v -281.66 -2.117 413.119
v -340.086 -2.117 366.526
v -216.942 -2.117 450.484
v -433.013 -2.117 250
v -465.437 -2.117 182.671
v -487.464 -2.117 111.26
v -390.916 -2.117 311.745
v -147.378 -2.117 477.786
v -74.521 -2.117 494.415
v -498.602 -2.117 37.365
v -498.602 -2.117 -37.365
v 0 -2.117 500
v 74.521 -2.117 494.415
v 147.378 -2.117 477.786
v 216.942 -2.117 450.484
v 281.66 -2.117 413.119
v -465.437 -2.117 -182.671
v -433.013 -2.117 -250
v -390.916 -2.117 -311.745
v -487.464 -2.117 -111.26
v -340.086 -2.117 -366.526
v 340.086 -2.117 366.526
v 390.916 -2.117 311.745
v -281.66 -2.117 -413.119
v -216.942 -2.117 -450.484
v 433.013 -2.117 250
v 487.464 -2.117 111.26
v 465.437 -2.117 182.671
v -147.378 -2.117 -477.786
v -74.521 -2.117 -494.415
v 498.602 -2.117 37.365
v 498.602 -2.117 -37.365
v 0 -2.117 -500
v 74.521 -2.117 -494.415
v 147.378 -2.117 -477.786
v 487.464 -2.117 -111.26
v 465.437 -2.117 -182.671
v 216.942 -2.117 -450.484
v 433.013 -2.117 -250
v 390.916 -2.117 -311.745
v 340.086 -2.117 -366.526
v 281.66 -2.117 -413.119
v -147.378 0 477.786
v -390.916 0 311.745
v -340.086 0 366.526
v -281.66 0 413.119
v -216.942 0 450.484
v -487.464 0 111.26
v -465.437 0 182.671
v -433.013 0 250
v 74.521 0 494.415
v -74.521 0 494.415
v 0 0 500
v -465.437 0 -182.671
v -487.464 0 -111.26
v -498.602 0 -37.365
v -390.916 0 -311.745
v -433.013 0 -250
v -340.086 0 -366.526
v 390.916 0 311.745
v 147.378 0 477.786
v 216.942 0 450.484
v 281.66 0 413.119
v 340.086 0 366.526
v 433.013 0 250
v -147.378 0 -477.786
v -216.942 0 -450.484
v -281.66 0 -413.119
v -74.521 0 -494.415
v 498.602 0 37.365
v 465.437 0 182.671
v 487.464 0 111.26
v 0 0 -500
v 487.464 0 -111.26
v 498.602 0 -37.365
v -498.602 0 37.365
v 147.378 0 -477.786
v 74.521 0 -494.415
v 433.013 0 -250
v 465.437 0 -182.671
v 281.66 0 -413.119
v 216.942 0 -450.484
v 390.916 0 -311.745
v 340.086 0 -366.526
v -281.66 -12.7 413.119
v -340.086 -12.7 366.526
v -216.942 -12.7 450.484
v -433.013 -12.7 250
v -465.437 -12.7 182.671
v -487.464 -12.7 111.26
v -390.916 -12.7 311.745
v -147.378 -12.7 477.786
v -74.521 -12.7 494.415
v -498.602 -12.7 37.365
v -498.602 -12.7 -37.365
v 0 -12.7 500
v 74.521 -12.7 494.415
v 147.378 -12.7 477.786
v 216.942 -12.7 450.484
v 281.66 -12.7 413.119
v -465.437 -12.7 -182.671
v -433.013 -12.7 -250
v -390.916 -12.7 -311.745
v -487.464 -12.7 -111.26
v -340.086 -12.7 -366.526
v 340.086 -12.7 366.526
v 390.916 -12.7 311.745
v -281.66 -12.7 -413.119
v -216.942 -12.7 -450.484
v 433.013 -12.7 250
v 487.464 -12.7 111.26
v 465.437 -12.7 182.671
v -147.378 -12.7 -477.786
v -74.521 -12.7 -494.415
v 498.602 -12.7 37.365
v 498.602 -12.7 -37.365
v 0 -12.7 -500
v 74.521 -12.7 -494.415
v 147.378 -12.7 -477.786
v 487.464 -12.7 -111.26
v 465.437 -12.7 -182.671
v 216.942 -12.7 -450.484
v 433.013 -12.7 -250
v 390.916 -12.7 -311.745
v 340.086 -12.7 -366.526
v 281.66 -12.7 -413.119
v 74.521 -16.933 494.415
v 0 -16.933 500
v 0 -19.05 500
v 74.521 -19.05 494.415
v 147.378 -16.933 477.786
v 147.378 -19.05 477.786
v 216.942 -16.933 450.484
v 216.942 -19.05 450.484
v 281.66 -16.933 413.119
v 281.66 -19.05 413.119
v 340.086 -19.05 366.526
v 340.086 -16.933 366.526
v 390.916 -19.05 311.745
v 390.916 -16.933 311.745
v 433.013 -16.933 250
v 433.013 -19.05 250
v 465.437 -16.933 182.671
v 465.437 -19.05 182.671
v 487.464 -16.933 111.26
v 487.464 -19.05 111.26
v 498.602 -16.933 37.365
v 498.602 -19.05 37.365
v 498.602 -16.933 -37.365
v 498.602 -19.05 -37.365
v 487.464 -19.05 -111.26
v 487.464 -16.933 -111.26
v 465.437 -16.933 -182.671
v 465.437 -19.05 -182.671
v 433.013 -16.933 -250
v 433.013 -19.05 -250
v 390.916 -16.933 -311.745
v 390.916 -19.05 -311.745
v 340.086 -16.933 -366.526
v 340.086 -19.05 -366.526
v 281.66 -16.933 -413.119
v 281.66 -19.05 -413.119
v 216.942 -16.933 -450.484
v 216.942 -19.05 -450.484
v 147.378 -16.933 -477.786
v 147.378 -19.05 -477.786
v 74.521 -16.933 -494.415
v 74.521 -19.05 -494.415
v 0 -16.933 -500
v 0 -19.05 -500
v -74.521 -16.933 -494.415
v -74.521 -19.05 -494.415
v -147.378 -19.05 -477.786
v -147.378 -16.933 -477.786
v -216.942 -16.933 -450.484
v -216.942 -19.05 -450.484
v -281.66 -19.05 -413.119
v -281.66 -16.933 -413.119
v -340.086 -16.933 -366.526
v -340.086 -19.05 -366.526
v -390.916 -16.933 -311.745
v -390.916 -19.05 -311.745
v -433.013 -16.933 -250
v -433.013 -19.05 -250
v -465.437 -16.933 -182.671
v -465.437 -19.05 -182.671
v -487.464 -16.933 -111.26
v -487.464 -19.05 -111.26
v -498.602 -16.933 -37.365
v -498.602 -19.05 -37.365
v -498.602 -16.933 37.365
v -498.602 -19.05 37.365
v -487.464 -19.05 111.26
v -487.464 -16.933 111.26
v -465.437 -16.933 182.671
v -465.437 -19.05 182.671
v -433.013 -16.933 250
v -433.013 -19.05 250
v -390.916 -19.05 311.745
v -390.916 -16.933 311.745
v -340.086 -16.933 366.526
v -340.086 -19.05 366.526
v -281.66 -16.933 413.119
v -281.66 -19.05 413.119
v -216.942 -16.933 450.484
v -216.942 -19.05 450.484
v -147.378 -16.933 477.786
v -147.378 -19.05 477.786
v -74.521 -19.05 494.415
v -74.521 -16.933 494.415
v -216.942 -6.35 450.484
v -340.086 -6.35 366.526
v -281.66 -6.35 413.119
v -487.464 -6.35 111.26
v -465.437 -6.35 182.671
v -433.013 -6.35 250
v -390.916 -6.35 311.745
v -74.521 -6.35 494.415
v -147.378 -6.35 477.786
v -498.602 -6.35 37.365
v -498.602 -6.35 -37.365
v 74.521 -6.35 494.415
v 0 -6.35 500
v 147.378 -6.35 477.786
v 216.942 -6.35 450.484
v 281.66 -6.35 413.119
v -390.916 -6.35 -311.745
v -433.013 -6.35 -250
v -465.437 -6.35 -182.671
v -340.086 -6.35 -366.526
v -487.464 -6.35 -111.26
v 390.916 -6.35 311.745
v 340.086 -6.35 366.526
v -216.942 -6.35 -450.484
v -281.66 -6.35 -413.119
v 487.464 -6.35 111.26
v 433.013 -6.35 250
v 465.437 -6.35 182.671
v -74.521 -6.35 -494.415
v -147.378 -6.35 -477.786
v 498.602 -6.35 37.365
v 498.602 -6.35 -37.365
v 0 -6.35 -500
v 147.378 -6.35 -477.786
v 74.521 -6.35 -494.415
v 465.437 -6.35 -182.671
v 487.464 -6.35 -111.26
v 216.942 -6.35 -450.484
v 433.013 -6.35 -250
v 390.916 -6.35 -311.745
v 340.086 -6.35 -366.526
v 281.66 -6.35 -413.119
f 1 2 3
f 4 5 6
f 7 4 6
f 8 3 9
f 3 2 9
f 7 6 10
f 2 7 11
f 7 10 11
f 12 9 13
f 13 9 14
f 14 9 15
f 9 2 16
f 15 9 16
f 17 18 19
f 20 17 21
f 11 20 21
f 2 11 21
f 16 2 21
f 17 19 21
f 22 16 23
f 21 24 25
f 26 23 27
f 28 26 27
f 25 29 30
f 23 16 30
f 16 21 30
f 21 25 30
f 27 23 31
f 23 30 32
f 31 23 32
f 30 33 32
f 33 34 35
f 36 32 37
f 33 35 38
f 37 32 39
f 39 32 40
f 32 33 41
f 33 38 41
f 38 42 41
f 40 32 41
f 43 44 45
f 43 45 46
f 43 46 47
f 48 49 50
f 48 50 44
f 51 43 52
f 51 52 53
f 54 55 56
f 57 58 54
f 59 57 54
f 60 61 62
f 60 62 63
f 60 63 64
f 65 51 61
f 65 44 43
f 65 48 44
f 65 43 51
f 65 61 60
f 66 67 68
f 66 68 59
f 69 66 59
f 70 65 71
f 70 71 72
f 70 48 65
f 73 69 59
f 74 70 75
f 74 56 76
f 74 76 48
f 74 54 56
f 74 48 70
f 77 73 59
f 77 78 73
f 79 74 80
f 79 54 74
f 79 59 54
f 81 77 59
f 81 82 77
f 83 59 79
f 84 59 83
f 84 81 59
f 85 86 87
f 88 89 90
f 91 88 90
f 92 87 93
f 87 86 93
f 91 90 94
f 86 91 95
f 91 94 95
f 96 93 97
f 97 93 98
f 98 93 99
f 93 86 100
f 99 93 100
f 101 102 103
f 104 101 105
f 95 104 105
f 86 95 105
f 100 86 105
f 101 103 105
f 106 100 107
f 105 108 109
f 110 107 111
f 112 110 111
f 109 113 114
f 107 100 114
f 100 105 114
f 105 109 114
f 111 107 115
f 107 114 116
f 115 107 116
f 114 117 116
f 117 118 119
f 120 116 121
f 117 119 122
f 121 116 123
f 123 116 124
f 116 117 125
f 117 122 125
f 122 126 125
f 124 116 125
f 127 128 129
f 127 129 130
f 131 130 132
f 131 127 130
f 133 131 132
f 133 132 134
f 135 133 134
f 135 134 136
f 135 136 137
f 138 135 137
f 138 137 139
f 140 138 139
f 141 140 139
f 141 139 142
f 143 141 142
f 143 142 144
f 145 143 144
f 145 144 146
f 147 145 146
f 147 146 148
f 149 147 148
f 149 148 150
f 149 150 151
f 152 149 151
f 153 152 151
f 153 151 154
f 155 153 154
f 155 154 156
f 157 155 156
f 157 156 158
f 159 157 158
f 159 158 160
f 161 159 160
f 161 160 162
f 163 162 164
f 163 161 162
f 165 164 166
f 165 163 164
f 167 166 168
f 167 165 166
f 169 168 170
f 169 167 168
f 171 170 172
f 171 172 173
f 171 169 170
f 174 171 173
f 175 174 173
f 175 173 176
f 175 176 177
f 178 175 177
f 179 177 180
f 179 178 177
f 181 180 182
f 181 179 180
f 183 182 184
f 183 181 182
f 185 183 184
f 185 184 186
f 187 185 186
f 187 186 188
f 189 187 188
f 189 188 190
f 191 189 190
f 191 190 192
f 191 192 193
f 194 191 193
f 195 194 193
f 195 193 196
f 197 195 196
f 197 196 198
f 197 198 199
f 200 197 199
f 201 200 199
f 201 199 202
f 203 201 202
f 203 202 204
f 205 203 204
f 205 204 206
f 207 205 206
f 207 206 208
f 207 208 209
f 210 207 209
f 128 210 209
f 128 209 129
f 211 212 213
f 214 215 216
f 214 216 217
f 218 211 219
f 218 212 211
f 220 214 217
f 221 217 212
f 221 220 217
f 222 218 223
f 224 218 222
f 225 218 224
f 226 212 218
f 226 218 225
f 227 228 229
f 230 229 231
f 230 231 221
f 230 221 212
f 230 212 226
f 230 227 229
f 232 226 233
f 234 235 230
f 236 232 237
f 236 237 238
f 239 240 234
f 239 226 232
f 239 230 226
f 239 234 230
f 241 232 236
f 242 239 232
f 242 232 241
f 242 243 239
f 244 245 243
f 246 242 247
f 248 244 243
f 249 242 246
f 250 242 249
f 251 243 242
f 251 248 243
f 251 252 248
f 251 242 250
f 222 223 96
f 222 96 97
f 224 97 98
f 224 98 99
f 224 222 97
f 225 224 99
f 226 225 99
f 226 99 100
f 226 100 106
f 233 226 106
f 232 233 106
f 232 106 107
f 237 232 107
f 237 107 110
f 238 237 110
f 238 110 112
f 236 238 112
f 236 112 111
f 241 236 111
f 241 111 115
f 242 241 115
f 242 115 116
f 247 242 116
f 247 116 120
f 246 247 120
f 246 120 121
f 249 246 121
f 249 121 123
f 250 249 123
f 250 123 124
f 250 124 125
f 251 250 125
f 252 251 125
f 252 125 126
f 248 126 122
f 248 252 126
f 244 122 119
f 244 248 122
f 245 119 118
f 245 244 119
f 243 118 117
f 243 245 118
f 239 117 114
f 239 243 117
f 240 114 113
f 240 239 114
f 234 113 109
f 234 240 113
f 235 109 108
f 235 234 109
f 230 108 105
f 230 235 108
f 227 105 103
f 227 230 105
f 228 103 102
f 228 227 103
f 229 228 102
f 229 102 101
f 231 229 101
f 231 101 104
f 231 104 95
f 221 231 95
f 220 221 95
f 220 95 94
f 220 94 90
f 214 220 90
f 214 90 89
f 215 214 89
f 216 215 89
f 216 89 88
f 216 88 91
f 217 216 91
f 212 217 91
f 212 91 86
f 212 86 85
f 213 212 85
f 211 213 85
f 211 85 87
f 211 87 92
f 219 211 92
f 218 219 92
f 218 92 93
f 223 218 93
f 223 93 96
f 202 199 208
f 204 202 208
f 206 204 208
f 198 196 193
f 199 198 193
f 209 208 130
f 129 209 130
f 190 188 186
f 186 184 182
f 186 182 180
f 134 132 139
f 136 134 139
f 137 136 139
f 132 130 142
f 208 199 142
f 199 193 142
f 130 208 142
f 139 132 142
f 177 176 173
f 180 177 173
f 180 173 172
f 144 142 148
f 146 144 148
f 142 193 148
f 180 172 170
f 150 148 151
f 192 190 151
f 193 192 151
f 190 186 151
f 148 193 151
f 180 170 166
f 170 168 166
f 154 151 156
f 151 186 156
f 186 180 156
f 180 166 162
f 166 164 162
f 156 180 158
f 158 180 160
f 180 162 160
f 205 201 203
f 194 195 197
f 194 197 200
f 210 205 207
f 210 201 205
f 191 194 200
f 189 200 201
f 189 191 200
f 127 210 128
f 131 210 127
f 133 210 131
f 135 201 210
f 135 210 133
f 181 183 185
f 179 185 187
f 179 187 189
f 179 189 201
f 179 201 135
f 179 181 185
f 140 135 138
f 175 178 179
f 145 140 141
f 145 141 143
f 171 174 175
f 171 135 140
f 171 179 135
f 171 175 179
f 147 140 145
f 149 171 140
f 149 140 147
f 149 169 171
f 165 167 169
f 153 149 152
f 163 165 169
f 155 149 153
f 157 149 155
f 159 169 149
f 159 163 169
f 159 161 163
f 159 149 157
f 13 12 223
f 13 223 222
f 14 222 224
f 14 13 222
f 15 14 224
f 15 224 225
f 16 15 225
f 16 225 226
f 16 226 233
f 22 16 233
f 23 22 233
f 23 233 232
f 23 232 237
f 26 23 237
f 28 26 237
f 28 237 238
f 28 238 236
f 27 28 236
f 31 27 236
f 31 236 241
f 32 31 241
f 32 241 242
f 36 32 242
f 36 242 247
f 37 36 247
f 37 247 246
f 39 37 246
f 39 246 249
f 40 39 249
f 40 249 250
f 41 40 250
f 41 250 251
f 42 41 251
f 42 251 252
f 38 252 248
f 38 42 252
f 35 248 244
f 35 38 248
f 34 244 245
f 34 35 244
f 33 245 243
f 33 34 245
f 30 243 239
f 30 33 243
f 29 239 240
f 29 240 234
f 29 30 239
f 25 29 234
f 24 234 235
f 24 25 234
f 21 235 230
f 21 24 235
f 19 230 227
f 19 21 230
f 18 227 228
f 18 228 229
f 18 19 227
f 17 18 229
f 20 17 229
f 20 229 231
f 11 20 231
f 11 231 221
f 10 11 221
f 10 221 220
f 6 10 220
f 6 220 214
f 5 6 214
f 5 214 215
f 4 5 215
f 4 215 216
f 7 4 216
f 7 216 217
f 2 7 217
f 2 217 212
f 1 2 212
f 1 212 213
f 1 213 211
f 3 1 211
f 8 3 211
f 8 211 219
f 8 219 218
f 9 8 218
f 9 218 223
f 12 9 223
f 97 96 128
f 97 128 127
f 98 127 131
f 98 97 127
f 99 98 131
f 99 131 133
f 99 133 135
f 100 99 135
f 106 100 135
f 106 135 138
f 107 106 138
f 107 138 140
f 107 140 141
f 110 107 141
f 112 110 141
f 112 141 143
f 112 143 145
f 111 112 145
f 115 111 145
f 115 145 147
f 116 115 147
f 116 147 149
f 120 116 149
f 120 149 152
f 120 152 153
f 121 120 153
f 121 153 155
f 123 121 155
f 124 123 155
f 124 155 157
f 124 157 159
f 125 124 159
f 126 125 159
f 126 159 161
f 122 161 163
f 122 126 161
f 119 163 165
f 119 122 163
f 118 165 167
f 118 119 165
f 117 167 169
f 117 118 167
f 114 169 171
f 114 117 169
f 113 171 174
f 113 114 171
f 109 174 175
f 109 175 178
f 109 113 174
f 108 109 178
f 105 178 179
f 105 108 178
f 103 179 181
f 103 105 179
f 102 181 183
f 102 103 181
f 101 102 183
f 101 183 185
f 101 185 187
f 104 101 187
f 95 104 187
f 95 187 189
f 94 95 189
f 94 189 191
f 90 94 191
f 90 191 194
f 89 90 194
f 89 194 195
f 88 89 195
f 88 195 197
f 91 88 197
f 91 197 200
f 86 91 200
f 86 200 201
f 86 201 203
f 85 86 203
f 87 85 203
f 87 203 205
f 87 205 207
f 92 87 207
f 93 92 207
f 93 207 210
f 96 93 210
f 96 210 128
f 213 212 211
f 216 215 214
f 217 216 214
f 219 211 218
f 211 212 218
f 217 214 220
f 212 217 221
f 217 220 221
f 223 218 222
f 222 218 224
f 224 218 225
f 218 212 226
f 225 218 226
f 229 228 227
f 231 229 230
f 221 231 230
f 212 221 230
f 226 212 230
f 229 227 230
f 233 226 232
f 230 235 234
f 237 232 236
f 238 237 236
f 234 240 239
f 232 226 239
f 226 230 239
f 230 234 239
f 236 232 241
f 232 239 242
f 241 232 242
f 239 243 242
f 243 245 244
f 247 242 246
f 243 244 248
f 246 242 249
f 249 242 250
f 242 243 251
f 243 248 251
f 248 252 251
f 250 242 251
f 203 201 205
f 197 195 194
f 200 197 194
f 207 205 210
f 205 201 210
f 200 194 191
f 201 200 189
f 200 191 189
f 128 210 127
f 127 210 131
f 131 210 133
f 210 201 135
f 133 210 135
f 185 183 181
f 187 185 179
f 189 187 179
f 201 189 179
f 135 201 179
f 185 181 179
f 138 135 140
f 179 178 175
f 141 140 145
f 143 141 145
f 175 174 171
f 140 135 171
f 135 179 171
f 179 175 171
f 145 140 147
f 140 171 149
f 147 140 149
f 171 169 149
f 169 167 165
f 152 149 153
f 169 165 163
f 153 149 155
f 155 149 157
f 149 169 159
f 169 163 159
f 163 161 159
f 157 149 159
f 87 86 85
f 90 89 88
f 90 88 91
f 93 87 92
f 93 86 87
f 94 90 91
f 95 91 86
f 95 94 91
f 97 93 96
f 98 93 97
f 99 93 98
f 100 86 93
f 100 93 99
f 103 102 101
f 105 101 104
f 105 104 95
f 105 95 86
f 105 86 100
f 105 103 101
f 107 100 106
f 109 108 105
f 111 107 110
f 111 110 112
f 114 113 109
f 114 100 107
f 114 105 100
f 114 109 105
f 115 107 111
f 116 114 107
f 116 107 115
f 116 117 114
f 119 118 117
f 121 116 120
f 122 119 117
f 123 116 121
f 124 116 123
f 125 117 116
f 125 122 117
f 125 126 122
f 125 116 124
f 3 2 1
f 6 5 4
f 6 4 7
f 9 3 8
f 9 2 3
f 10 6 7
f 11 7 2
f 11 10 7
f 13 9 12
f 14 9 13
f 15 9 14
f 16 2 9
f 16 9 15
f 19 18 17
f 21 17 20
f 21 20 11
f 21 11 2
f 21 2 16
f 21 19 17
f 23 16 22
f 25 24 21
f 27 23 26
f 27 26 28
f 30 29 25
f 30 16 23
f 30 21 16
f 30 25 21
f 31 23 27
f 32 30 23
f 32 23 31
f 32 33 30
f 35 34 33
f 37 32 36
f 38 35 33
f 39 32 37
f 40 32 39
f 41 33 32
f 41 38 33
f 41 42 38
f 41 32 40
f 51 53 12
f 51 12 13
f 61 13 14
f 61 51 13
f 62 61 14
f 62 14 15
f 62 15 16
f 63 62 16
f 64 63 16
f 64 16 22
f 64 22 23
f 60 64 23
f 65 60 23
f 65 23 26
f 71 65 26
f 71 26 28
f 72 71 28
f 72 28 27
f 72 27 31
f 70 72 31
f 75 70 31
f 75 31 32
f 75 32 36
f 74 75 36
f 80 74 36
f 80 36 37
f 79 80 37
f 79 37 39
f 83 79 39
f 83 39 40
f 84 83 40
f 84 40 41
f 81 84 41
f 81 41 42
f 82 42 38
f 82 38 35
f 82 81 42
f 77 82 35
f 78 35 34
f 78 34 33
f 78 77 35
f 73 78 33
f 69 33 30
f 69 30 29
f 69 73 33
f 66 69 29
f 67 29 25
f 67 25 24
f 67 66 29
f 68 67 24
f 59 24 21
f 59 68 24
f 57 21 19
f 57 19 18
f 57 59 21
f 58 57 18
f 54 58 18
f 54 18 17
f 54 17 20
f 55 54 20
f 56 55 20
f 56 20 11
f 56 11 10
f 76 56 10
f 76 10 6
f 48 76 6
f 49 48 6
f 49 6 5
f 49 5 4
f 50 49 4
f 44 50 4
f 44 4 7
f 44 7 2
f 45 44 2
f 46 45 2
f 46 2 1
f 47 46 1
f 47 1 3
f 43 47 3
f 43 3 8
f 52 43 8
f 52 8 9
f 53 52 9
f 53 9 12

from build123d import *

# Parameters (mm, degrees)
SKETCH3_W                = 1219.2
SKETCH3_H                = 1219.2
BOSS_EXTRUDE1_DEPTH      = 19.05
SPLIT1_SURFACE_1_1_BACK  = 1725.314
SPLIT1_SURFACE_1_1_DEPTH = 3450.628
SPLIT1_SURFACE_1_2_BACK  = 1725.314
SPLIT1_SURFACE_1_2_DEPTH = 3450.628
SPLIT1_SURFACE_2_3_BACK  = 1725.314
SPLIT1_SURFACE_2_3_DEPTH = 3450.628
SPLIT1_SURFACE_2_4_BACK  = 1725.314
SPLIT1_SURFACE_2_4_DEPTH = 3450.628
SPLIT1_SURFACE_3_5_BACK  = 1725.314
SPLIT1_SURFACE_3_5_DEPTH = 3450.628
SPLIT1_SURFACE_3_6_BACK  = 1725.314
SPLIT1_SURFACE_3_6_DEPTH = 3450.628
SPLIT1_SURFACE_4_7_BACK  = 1725.314
SPLIT1_SURFACE_4_7_DEPTH = 3450.628
SPLIT1_SURFACE_4_8_BACK  = 1725.314
SPLIT1_SURFACE_4_8_DEPTH = 3450.628
SKETCH6_W                = 1219.2
SKETCH6_H                = 1219.2
SKETCH6_R                = 500
CUT_EXTRUDE1_DEPTH       = 863.315036689


with BuildPart() as part:
    # Sketch3 → Boss-Extrude1 (new body)
    with BuildSketch(Plane(origin=(0, 0, 0), x_dir=(1, 0, 0), z_dir=(0, 1, 0))):
        Rectangle(SKETCH3_W, SKETCH3_H)
    extrude(amount=-BOSS_EXTRUDE1_DEPTH)


with BuildPart() as body_2:
    # Split1: the piece behind the surface
    add(part.part)
    # Split1 surface 1: a surface, the sketch's curves swept straight by 3450.628 mm
    with BuildLine(Plane.XY.offset(-SPLIT1_SURFACE_1_1_BACK), mode=Mode.PRIVATE) as split1_surface_1_1_path:
        Line((-670.56, -16.933333333), (670.56, -16.933333333))
    split1_surface_1_1 = Shell.extrude(split1_surface_1_1_path.wire(), (0 * SPLIT1_SURFACE_1_1_DEPTH, 0 * SPLIT1_SURFACE_1_1_DEPTH, 1 * SPLIT1_SURFACE_1_1_DEPTH))
    split(bisect_by=split1_surface_1_1, keep=Keep.BOTTOM)


with BuildPart() as part_1:
    add(part.part)

    # Split1: split by a surface, the side it looks to stays
    # Split1 surface 1: a surface, the sketch's curves swept straight by 3450.628 mm
    with BuildLine(Plane.XY.offset(-SPLIT1_SURFACE_1_2_BACK), mode=Mode.PRIVATE) as split1_surface_1_2_path:
        Line((-670.56, -16.933333333), (670.56, -16.933333333))
    split1_surface_1_2 = Shell.extrude(split1_surface_1_2_path.wire(), (0 * SPLIT1_SURFACE_1_2_DEPTH, 0 * SPLIT1_SURFACE_1_2_DEPTH, 1 * SPLIT1_SURFACE_1_2_DEPTH))
    split(bisect_by=split1_surface_1_2, keep=Keep.TOP)


with BuildPart() as body_3:
    # Split1 2: the piece behind the surface
    add(part_1.part)
    # Split1 surface 2: a surface, the sketch's curves swept straight by 3450.628 mm
    with BuildLine(Plane.XY.offset(-SPLIT1_SURFACE_2_3_BACK), mode=Mode.PRIVATE) as split1_surface_2_3_path:
        Line((-670.56, -12.7), (670.56, -12.7))
    split1_surface_2_3 = Shell.extrude(split1_surface_2_3_path.wire(), (0 * SPLIT1_SURFACE_2_3_DEPTH, 0 * SPLIT1_SURFACE_2_3_DEPTH, 1 * SPLIT1_SURFACE_2_3_DEPTH))
    split(bisect_by=split1_surface_2_3, keep=Keep.BOTTOM)


with BuildPart() as part_2:
    add(part_1.part)

    # Split1 2: split by a surface, the side it looks to stays
    # Split1 surface 2: a surface, the sketch's curves swept straight by 3450.628 mm
    with BuildLine(Plane.XY.offset(-SPLIT1_SURFACE_2_4_BACK), mode=Mode.PRIVATE) as split1_surface_2_4_path:
        Line((-670.56, -12.7), (670.56, -12.7))
    split1_surface_2_4 = Shell.extrude(split1_surface_2_4_path.wire(), (0 * SPLIT1_SURFACE_2_4_DEPTH, 0 * SPLIT1_SURFACE_2_4_DEPTH, 1 * SPLIT1_SURFACE_2_4_DEPTH))
    split(bisect_by=split1_surface_2_4, keep=Keep.TOP)


with BuildPart() as body_4_2:
    # Split1 3: the piece behind the surface
    add(part_2.part)
    # Split1 surface 3: a surface, the sketch's curves swept straight by 3450.628 mm
    with BuildLine(Plane.XY.offset(-SPLIT1_SURFACE_3_5_BACK), mode=Mode.PRIVATE) as split1_surface_3_5_path:
        Line((-670.56, -2.116666667), (670.56, -2.116666667))
    split1_surface_3_5 = Shell.extrude(split1_surface_3_5_path.wire(), (0 * SPLIT1_SURFACE_3_5_DEPTH, 0 * SPLIT1_SURFACE_3_5_DEPTH, 1 * SPLIT1_SURFACE_3_5_DEPTH))
    split(bisect_by=split1_surface_3_5, keep=Keep.BOTTOM)


with BuildPart() as part_3:
    add(part_2.part)

    # Split1 3: split by a surface, the side it looks to stays
    # Split1 surface 3: a surface, the sketch's curves swept straight by 3450.628 mm
    with BuildLine(Plane.XY.offset(-SPLIT1_SURFACE_3_6_BACK), mode=Mode.PRIVATE) as split1_surface_3_6_path:
        Line((-670.56, -2.116666667), (670.56, -2.116666667))
    split1_surface_3_6 = Shell.extrude(split1_surface_3_6_path.wire(), (0 * SPLIT1_SURFACE_3_6_DEPTH, 0 * SPLIT1_SURFACE_3_6_DEPTH, 1 * SPLIT1_SURFACE_3_6_DEPTH))
    split(bisect_by=split1_surface_3_6, keep=Keep.TOP)


with BuildPart() as body_5_2:
    # Split1 4 body 4 2: the piece behind the surface
    add(body_4_2.part)
    # Split1 surface 4: a surface, the sketch's curves swept straight by 3450.628 mm
    with BuildLine(Plane.XY.offset(-SPLIT1_SURFACE_4_7_BACK), mode=Mode.PRIVATE) as split1_surface_4_7_path:
        Line((-670.56, -6.35), (670.56, -6.35))
    split1_surface_4_7 = Shell.extrude(split1_surface_4_7_path.wire(), (0 * SPLIT1_SURFACE_4_7_DEPTH, 0 * SPLIT1_SURFACE_4_7_DEPTH, 1 * SPLIT1_SURFACE_4_7_DEPTH))
    split(bisect_by=split1_surface_4_7, keep=Keep.BOTTOM)


with BuildPart() as body_4_2_1:
    add(body_4_2.part)

    # Split1 4 body 4 2: split by a surface, the side it looks to stays
    # Split1 surface 4: a surface, the sketch's curves swept straight by 3450.628 mm
    with BuildLine(Plane.XY.offset(-SPLIT1_SURFACE_4_8_BACK), mode=Mode.PRIVATE) as split1_surface_4_8_path:
        Line((-670.56, -6.35), (670.56, -6.35))
    split1_surface_4_8 = Shell.extrude(split1_surface_4_8_path.wire(), (0 * SPLIT1_SURFACE_4_8_DEPTH, 0 * SPLIT1_SURFACE_4_8_DEPTH, 1 * SPLIT1_SURFACE_4_8_DEPTH))
    split(bisect_by=split1_surface_4_8, keep=Keep.TOP)


with BuildPart() as cut_extrude1_tool:
    # Sketch6 → Cut-Extrude1 (new, through all)
    with BuildSketch(Plane(origin=(0, 0, 0), x_dir=(1, 0, 0), z_dir=(0, 1, 0))):
        Rectangle(SKETCH6_W, SKETCH6_H)
        with Locations(Location((0, 0, 0), (0, 0, 270))):
            Circle(SKETCH6_R, mode=Mode.SUBTRACT)
    extrude(amount=-CUT_EXTRUDE1_DEPTH)


with BuildPart() as part_4:
    add(part_3.part)

    # Cut-Extrude1: cut by cut_extrude1_tool
    add(cut_extrude1_tool.part, mode=Mode.SUBTRACT)


with BuildPart() as body_2_1:
    add(body_2.part)

    # Cut-Extrude1: cut by cut_extrude1_tool
    add(cut_extrude1_tool.part, mode=Mode.SUBTRACT)


with BuildPart() as body_3_1:
    add(body_3.part)

    # Cut-Extrude1: cut by cut_extrude1_tool
    add(cut_extrude1_tool.part, mode=Mode.SUBTRACT)


with BuildPart() as body_4_2_2:
    add(body_4_2_1.part)

    # Cut-Extrude1: cut by cut_extrude1_tool
    add(cut_extrude1_tool.part, mode=Mode.SUBTRACT)


with BuildPart() as body_5_2_1:
    add(body_5_2.part)

    # Cut-Extrude1: cut by cut_extrude1_tool
    add(cut_extrude1_tool.part, mode=Mode.SUBTRACT)


solid = Compound([part_4.part, body_2_1.part, body_3_1.part, body_4_2_2.part, body_5_2_1.part])
